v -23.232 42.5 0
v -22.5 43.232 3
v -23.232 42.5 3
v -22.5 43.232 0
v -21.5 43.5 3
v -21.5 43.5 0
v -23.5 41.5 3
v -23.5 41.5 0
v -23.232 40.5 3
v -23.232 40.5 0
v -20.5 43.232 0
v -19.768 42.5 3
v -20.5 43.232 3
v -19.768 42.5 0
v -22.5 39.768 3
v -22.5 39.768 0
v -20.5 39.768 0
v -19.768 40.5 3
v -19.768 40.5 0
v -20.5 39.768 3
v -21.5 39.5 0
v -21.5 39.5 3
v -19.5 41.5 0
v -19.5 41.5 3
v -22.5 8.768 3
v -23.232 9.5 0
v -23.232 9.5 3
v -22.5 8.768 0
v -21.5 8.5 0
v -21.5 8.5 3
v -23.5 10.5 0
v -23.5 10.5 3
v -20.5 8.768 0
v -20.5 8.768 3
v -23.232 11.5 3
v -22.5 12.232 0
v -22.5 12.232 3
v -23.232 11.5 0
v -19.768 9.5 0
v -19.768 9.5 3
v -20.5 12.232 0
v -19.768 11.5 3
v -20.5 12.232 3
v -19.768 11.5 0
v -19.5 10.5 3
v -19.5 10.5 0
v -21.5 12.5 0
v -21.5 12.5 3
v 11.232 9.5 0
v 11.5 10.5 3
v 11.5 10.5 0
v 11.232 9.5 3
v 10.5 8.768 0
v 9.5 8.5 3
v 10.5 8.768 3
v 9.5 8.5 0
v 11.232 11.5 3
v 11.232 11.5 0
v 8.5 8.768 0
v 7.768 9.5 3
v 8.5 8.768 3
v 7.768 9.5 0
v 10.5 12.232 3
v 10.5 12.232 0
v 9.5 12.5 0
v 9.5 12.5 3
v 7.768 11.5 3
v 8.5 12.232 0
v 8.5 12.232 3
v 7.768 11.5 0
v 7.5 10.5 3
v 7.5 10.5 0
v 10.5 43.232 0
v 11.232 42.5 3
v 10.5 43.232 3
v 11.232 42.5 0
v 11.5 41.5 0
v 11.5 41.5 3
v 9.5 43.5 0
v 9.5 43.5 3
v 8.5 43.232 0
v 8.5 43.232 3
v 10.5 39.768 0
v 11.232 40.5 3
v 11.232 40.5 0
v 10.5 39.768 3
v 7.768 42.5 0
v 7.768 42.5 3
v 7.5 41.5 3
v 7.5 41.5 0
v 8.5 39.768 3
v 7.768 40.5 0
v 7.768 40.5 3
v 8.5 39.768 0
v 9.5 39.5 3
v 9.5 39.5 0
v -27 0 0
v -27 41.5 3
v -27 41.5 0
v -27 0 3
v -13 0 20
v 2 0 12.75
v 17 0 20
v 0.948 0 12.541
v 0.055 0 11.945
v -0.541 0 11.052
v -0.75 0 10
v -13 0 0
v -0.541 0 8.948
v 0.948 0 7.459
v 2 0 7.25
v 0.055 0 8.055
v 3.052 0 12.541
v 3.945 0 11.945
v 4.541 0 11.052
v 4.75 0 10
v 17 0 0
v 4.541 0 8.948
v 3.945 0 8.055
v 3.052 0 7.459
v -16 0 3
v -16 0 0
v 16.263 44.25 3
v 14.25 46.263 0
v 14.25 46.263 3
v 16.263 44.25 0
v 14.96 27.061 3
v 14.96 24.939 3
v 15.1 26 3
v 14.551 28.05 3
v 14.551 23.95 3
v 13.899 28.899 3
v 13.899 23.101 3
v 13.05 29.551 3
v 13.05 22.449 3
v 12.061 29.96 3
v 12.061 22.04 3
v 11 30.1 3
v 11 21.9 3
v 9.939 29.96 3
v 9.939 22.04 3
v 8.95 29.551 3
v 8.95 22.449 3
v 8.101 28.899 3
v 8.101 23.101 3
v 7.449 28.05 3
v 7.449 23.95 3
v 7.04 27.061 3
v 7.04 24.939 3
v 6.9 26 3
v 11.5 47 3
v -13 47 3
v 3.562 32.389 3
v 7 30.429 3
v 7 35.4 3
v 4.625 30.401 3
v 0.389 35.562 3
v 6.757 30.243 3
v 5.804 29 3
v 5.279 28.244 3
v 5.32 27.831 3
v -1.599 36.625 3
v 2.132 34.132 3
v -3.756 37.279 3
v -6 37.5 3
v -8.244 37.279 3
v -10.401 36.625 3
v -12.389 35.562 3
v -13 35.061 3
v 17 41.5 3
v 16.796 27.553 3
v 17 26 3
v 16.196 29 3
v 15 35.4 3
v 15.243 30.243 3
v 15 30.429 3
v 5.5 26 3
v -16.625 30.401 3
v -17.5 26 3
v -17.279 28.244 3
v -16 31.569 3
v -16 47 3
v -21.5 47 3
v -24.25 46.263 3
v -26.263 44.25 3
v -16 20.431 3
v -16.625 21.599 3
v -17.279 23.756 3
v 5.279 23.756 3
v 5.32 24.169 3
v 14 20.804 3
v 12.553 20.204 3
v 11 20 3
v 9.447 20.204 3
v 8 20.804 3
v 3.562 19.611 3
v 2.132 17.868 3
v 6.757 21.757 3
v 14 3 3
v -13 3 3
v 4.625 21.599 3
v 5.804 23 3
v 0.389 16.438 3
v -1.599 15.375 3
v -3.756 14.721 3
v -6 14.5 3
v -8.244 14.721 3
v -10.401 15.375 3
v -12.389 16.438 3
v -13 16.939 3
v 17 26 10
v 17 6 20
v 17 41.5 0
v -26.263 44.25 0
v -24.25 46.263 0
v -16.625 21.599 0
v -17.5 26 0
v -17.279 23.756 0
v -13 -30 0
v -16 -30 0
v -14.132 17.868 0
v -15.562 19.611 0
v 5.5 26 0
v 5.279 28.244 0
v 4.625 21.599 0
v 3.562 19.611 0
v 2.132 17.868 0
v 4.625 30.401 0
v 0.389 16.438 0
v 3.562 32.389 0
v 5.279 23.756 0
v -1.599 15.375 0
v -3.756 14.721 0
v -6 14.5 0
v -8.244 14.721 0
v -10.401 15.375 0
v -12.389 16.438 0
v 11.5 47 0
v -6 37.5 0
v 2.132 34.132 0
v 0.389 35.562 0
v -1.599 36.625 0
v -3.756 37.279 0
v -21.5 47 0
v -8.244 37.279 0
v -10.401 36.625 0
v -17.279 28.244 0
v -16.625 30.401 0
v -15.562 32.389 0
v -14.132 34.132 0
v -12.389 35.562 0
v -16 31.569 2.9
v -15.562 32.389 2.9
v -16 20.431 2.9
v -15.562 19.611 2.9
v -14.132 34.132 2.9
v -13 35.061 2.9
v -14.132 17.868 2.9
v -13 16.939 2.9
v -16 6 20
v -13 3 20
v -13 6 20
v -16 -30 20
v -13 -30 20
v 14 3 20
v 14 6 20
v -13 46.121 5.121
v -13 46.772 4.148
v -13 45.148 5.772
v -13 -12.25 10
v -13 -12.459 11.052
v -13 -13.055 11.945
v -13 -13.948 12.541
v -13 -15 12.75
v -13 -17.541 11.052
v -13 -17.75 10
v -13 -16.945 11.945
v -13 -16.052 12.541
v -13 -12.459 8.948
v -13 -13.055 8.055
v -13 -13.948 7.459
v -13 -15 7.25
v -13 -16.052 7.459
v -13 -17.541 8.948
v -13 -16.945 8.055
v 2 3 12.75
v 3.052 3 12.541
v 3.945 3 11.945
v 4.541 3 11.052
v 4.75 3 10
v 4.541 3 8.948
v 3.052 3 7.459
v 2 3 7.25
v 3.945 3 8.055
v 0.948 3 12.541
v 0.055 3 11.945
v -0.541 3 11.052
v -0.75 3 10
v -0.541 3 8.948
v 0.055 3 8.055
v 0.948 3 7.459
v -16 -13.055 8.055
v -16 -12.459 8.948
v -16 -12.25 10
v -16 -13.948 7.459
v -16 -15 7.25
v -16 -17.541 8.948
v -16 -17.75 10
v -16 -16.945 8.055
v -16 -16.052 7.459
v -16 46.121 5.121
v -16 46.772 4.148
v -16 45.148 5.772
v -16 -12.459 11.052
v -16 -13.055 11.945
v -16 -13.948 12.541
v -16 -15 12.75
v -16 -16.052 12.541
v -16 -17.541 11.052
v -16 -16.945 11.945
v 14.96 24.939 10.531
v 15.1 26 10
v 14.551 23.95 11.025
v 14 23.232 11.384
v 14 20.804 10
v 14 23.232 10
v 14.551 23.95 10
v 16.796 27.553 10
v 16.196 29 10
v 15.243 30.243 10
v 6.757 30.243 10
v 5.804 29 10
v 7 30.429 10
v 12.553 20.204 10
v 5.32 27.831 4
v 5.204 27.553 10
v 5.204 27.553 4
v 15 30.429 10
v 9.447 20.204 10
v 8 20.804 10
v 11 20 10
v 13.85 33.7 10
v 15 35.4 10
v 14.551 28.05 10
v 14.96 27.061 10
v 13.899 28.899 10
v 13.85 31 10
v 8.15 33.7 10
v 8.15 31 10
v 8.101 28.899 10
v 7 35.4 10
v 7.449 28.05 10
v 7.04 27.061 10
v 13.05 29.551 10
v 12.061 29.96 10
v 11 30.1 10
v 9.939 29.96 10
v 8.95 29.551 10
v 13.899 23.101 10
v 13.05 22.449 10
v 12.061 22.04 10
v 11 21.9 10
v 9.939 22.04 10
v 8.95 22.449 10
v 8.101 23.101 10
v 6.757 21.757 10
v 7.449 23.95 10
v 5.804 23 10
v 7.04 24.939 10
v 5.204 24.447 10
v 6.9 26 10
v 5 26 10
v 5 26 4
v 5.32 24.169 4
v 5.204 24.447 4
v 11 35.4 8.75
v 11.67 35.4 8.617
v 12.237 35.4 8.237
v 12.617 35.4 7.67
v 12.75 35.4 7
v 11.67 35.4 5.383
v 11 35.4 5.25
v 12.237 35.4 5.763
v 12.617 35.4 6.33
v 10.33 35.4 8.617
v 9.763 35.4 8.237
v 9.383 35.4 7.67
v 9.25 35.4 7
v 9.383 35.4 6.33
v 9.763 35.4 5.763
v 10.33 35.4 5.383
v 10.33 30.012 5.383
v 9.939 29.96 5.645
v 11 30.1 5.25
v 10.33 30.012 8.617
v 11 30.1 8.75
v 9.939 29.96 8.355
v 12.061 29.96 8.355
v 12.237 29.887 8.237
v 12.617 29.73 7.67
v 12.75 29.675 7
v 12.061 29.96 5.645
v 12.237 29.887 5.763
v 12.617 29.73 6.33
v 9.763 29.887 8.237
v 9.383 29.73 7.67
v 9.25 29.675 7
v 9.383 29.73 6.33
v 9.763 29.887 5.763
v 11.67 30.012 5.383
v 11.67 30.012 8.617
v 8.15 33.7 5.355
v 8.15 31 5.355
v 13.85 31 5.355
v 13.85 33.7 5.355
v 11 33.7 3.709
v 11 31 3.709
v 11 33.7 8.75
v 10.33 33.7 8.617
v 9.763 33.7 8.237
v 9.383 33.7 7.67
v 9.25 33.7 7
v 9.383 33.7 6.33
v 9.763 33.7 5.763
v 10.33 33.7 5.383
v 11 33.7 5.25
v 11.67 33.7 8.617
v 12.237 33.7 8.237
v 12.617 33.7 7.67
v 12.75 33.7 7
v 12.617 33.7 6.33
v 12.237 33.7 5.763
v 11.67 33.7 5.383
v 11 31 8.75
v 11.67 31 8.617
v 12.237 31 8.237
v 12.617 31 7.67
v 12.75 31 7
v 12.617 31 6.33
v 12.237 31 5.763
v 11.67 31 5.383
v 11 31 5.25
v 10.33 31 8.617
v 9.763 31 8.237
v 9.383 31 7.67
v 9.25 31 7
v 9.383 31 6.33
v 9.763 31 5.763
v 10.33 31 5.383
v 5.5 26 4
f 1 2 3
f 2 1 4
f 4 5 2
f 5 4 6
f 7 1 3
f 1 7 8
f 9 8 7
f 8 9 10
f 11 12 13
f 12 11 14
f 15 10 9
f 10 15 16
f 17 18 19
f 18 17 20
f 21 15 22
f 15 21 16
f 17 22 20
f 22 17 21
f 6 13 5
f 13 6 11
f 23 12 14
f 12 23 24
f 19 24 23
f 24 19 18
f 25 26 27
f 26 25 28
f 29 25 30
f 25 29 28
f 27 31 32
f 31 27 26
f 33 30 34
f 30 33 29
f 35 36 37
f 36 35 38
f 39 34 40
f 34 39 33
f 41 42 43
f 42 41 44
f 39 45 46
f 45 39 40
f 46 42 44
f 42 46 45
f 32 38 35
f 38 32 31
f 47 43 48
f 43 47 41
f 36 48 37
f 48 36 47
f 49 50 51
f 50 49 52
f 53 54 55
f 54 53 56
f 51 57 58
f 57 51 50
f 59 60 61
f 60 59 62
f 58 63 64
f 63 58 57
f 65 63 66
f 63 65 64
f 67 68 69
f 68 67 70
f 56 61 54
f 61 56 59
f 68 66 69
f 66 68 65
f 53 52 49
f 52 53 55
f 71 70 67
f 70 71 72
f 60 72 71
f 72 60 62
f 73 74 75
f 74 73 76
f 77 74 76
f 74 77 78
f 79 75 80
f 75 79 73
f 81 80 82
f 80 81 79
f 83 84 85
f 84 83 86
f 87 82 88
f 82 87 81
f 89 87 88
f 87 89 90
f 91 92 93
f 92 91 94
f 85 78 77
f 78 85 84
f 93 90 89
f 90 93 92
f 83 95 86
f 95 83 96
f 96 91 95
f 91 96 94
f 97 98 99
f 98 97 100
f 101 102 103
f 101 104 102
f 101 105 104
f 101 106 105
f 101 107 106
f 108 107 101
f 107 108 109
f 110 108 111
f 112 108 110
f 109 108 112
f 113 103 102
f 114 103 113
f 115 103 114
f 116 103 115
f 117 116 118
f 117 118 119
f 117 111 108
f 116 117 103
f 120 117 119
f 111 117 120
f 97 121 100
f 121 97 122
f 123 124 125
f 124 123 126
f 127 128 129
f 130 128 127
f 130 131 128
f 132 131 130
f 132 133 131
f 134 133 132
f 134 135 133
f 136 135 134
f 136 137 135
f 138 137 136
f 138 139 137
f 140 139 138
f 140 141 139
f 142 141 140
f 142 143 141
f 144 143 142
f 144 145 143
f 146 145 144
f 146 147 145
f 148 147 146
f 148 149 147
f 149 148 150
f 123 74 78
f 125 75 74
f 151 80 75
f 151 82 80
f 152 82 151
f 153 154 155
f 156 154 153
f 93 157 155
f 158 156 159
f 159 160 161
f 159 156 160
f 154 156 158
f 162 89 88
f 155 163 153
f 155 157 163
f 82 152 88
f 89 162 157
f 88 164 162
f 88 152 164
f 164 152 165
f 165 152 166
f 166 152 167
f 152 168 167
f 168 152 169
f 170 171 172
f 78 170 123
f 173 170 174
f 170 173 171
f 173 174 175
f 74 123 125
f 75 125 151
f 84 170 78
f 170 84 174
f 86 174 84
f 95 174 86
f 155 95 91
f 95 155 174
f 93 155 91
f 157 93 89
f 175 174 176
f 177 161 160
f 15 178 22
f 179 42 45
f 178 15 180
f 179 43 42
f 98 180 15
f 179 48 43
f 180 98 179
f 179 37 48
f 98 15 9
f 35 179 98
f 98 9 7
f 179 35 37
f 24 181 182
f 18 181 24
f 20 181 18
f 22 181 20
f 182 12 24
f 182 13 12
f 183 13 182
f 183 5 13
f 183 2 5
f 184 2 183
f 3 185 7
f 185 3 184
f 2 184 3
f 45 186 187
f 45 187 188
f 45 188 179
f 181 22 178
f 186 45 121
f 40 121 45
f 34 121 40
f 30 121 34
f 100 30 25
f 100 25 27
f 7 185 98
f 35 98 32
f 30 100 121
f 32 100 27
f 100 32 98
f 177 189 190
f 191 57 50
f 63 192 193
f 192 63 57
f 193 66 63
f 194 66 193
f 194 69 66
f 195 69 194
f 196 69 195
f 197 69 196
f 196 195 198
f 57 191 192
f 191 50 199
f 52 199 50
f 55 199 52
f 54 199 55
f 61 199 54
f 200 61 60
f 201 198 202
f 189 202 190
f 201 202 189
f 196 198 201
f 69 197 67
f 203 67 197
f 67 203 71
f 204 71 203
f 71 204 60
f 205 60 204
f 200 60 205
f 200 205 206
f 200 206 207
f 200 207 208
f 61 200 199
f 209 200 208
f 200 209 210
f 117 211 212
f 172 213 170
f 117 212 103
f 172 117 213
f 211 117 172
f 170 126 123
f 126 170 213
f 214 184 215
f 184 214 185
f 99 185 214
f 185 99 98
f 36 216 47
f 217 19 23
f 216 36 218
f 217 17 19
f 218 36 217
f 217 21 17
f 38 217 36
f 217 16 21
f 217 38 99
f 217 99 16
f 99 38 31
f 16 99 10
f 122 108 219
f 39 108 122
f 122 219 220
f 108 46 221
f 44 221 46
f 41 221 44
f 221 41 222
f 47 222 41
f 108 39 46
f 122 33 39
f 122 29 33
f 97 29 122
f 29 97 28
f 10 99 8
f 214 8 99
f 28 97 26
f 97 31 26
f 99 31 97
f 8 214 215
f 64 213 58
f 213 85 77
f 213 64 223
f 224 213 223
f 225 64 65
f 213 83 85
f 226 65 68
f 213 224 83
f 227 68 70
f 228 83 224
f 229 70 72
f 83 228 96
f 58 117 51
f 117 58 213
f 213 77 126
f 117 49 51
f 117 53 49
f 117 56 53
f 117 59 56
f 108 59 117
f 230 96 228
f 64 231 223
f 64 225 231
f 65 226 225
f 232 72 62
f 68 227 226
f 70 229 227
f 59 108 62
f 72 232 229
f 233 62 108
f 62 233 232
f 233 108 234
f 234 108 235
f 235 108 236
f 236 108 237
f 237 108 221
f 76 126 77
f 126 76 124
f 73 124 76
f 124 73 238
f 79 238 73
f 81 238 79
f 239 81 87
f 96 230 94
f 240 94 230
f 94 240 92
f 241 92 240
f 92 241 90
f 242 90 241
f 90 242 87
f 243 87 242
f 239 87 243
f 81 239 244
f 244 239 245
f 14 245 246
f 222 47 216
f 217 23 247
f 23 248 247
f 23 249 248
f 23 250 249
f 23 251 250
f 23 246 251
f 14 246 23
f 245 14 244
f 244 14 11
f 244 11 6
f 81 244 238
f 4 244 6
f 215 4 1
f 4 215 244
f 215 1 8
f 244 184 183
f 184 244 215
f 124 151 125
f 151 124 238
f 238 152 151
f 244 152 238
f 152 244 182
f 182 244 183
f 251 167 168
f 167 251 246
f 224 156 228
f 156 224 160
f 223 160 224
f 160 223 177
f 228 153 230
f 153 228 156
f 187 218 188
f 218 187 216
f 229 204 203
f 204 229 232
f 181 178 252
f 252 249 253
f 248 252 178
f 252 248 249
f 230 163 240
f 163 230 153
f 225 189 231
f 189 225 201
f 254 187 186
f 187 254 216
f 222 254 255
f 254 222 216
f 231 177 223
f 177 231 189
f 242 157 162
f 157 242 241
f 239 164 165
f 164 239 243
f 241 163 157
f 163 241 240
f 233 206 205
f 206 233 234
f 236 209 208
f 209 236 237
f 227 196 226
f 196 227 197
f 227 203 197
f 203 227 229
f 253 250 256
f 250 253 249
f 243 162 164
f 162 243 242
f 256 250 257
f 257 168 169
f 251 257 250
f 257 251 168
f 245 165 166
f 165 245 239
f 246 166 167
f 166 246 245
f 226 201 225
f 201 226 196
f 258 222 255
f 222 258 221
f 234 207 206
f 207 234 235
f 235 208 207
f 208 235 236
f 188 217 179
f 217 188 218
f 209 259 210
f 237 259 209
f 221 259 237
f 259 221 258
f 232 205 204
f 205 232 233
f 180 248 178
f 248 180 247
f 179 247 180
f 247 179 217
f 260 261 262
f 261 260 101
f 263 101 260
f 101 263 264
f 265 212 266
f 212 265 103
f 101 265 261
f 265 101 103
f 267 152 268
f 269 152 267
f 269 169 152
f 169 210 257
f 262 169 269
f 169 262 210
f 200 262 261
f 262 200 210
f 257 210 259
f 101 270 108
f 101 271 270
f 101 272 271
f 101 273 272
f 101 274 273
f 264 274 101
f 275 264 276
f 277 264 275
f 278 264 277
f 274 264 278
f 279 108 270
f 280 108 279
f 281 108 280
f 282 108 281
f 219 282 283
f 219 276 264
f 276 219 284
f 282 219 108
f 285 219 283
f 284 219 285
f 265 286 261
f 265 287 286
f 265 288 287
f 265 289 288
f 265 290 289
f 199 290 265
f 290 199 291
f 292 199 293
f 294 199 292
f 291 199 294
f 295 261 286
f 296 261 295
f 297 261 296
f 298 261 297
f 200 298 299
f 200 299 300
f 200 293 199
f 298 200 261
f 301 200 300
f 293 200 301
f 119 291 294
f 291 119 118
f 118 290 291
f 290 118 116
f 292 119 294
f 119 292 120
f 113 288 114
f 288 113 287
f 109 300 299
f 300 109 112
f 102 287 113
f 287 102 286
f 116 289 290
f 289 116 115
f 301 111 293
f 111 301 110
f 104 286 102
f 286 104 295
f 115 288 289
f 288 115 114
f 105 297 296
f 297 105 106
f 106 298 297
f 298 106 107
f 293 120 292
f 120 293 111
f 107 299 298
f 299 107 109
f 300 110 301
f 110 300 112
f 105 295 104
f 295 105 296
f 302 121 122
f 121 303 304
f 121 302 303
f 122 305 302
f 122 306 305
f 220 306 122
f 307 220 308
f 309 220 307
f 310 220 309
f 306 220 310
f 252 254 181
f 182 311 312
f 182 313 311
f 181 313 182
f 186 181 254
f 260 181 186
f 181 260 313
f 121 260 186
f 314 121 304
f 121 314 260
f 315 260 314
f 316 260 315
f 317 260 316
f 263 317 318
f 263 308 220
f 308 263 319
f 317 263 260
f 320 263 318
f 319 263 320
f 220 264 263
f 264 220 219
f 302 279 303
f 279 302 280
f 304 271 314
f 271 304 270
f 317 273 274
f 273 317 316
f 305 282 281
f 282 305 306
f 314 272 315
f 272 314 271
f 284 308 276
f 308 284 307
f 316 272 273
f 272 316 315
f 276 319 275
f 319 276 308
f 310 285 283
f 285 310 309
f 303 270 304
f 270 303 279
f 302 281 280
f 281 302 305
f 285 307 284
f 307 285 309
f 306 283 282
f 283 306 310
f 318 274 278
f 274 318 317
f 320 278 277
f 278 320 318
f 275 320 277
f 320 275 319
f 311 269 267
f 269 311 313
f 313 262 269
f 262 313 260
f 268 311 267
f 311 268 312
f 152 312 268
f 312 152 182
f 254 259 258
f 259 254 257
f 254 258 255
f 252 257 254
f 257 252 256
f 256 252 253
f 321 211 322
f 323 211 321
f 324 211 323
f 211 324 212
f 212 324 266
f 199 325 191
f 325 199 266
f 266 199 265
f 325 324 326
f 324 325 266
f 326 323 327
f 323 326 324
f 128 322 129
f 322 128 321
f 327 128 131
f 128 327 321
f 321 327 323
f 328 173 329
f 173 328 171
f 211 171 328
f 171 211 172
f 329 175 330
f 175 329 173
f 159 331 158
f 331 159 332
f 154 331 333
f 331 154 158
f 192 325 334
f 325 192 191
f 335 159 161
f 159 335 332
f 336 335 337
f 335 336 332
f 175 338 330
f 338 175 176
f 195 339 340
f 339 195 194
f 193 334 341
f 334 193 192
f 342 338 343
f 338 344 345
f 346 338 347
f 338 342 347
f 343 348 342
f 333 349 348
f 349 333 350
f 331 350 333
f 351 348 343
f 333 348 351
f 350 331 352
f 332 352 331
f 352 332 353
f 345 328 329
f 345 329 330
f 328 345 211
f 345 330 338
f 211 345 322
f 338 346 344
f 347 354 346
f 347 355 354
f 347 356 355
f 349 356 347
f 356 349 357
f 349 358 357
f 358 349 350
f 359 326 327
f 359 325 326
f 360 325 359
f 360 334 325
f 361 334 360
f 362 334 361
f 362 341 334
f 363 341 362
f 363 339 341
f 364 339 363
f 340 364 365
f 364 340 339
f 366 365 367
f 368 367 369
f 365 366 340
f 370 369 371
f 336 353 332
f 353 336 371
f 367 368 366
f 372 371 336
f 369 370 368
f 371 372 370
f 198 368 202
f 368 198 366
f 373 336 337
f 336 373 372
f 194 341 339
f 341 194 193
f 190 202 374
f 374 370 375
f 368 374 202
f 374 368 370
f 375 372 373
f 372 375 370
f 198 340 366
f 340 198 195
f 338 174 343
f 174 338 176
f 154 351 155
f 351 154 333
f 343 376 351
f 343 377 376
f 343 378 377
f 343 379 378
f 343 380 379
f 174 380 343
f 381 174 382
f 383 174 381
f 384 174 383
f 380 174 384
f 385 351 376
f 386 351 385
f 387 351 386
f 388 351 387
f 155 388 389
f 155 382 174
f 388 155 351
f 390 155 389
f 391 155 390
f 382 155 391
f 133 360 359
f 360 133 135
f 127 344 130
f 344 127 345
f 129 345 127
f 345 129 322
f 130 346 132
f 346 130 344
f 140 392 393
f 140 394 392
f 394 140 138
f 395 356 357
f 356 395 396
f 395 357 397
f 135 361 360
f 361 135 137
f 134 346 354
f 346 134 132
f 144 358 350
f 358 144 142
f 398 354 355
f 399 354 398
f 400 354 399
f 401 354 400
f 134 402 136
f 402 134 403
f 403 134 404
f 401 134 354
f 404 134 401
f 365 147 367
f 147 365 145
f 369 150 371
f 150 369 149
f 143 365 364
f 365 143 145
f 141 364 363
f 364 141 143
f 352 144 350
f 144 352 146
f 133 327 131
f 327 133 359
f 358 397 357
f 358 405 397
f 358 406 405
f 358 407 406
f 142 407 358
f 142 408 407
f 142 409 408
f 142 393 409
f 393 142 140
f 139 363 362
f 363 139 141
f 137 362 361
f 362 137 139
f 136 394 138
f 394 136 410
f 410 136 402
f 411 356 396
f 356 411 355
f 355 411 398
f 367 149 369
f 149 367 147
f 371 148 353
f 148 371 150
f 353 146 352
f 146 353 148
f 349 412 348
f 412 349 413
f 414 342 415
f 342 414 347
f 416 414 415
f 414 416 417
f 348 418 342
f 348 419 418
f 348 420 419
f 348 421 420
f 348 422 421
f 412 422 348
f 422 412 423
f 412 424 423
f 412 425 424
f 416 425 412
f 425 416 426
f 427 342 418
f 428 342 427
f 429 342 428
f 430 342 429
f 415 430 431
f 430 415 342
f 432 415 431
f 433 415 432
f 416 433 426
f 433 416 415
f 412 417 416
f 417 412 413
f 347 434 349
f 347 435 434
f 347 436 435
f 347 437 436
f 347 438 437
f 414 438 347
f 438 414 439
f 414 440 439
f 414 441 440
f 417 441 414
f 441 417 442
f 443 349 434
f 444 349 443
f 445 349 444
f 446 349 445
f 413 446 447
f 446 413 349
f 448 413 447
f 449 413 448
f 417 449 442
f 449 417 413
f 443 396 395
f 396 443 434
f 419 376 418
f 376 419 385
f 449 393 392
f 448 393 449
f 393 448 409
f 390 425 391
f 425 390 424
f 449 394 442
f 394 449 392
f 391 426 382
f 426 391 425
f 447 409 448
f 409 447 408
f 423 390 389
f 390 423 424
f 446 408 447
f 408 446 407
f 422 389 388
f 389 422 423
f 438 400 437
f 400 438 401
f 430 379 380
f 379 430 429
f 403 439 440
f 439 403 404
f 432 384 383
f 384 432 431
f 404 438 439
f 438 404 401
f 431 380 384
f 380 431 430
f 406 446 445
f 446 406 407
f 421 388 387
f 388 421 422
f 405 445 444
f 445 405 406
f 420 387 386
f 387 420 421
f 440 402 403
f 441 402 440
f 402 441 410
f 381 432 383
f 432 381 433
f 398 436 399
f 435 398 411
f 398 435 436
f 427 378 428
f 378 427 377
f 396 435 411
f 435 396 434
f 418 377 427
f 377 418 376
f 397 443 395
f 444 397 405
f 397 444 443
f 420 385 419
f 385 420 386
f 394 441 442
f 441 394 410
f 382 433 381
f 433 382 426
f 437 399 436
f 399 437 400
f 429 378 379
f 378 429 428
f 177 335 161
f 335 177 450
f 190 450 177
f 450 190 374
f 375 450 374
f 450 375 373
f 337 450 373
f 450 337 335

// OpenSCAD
// file: modules.scad
// Fonctions personnalisées

//http://forum.openscad.org/Wish-mirror-copy-true-td10681.html
module copy_mirror(vec=[0,1,0])
{
    children();
    mirror(vec) children();
}

module ecrou(plat,h){
  cylinder(d=plat*2/sqrt(3), h=h, $fn=6);
}


module courroie(diam,longueur){
  color ("black")
  difference(){
    hull(){
      cylinder(d=diam+1, h=6, $fn=32);
      translate([longueur,0,0]) cylinder(d=diam+1, h=6, $fn=32);
    }
    translate([0,0,-1])
    hull(){
      cylinder(d=diam-1, h=8, $fn=32);
      translate([longueur,0,0]) cylinder(d=diam-1, h=8, $fn=32);
    }
  }
  
  
}
// file: config.scad
// Paramètres de la machine

decal=-30;            // décallage du chassis xz
hauteur=400;          // hauteur totale chassis
largeur=400;          // largeur totale chassis
longueur=470;         // longueur totale chassis
hauteur_base=90;      // hauteur de la base
entraxe_y=140;        // distance entre les tiges Ø8 axe Y
entraxe_x=45;         // distance entre les tiges Ø8 axe X

couleur=[1,0.6,0];



// Paramètre des pièces et jeux

// écart plateau/courroie
// y_belt_holder
belt_h=13;      // écart entre la courroie et le plateau

// écart plateau/tiges lisses
// y_lm8uu
decal_plateau=12; // Décallage en Y

// décallage des tiges lisses Y
// support_tige8_y
decal_tiges=5;

// décallage moteur Y
// y_motor
decal_motory_z=11;
decal_motory_y=25;

// Equerres de fixation position fermée
eq_ec=10;      // écart entre profilés

// Fixations axe Z
pos_z=26;      // position des axes par rapport au profilé (>= 21)
hauteur_z=20;  // hauteur des fixations
entraxe_z=17;  // distance entre les tiges Ø8 et M5
// est ce que la tige de 8 dépasse du profilé de 30?
// si oui, on décale les fixations
decalx=max(-42/2+entraxe_z+8/2+2, 0);

// Roulements linéaires
lbd = 15; // diamètre ext
lbh = 24; // hauteur

// x_carriage
he_x=23;  // entraxe hotend x
he_y=23;  // entraxe hotend y
sen_x=13; // entraxe capteur x
sen_y=23; // entraxe capteur y

// Plats écrous
ec3=5.7;
ec4=7.2;
ec5=8.2;
ec6=10.2;

// Jeu sur plats pour les écrous glissants
jec=0.2;

// hauteur écrous
ec3h=2.4;
ec4h=3.2;
ec5h=4.7;
ec6h=5.2;

// Vis
vis3=3.5;
vis4=4.5;
vis5=5.5;
vis6=6.5;

// nombre de dents des poulies
poulie=20;

// Pas des courroies
pas=2;

// diamètre des poulies
dpoulie=poulie*pas/3.1416;
// main file
// eLKa1
// z_motor
// GNU GPL v3
// lkiefer <blog.lkiefer.org> and contributors
// http://www.reprap.org/wiki/ELKa
// https://github.com/kimented/elka1

include <config.scad>;
use <modules.scad>;

module z_motor_l(){
  ep=3;
  color(couleur)
  translate([-42/2+30/2,pos_z,0]){
    difference(){
      // base
      hull(){
        translate([31/2+decalx,31/2,0]) cylinder(d=(42-31), h=ep, $fn=12);
        translate([-31/2,31/2,0]) cylinder(d=(42-31), h=ep, $fn=12);
        translate([-42/2,-pos_z,0]) cube([42+decalx,1,ep]);
      }
      // trou axe moteur
      translate([0,0,-1]) cylinder(d=23, h=ep+2, $fn=32);
      // trous fix moteur
      for (i=[1:4]) rotate ([0,0,90*i]) translate([31/2,31/2,-1]) cylinder(d=4, h=ep+2, $fn=12);
    }
    // fixation face
    difference(){
      translate([-(30-42/2)+decalx,-pos_z,0]) cube([30,ep,hauteur_z]);
      translate([42/2-30/2+decalx, -pos_z-1,hauteur_z/2]) rotate([-90,0,0]) cylinder(h=ep+2, d=vis5, $fn=16);
    }
    // fixation coté
    difference(){
      translate([42/2-30-ep+decalx,-pos_z-30,0]) cube([ep,30,hauteur_z]);
      translate([42/2-30-ep+decalx-1,-pos_z-30/2,hauteur_z/2]) rotate([0,90,0]) cylinder(d=vis5, h=ep+2, $fn=16);}
    // nervure droite
    translate([-42+30+decalx,0,0])
    difference(){
      hull(){
        translate([0,42/2-ep,ep]) rotate([0,90,0]) cylinder(h=ep, d=2*ep, $fn=16);
        translate([0,-pos_z,0]) cube([ep,ep*2,hauteur_z]);
      }
      translate([-1,-pos_z-1,-1.1]) cube([ep+2, 42/2+pos_z+2, ep+1]);
    }
    translate([42/2+decalx-ep,0,0])
    // nervure gauche
    difference(){
      hull(){
        translate([0,-1,ep]) cube([ep,1,7]);
        translate([0,-pos_z,0]) cube([ep,ep*2,hauteur_z]);
      }
      translate([-1,-pos_z-1,-1.1]) cube([ep+2, 42/2+pos_z+2, ep+1]);
      //trou tige
      translate([-4-2+ep,0,ep]) cylinder(d=8+0.2, h=hauteur, $fn=24);
    }
    // tige 8 + ecrou prisonier
    translate([entraxe_z,0,0])
    difference(){
      union(){
        cylinder(d=8+2*2, h=7+ep, $fn=24);
        translate([-4,0,0]) cube([8,ec3h+8/2+3,7+ep]);
      }
      translate([0,0,ep]) cylinder(d=8+0.2, h=7+1, $fn=24);
      hull(){
        translate([0,8/2+1,ep+8/2]) rotate([-90,90,0]) ecrou(5.7,ec3h+0.3);
        translate([0,8/2+1,ep+8]) rotate([-90,90,0]) ecrou(5.7,ec3h+0.3);
      }
      translate([0,0,ep+8/2]) rotate([-90,90,0]) cylinder(d=vis3, h=8+8, $fn=16);
      // trou axe moteur
      translate([-entraxe_z,0,-1]) cylinder(d=23, h=ep+2, $fn=32);
    }
  }
}

z_motor_l();
